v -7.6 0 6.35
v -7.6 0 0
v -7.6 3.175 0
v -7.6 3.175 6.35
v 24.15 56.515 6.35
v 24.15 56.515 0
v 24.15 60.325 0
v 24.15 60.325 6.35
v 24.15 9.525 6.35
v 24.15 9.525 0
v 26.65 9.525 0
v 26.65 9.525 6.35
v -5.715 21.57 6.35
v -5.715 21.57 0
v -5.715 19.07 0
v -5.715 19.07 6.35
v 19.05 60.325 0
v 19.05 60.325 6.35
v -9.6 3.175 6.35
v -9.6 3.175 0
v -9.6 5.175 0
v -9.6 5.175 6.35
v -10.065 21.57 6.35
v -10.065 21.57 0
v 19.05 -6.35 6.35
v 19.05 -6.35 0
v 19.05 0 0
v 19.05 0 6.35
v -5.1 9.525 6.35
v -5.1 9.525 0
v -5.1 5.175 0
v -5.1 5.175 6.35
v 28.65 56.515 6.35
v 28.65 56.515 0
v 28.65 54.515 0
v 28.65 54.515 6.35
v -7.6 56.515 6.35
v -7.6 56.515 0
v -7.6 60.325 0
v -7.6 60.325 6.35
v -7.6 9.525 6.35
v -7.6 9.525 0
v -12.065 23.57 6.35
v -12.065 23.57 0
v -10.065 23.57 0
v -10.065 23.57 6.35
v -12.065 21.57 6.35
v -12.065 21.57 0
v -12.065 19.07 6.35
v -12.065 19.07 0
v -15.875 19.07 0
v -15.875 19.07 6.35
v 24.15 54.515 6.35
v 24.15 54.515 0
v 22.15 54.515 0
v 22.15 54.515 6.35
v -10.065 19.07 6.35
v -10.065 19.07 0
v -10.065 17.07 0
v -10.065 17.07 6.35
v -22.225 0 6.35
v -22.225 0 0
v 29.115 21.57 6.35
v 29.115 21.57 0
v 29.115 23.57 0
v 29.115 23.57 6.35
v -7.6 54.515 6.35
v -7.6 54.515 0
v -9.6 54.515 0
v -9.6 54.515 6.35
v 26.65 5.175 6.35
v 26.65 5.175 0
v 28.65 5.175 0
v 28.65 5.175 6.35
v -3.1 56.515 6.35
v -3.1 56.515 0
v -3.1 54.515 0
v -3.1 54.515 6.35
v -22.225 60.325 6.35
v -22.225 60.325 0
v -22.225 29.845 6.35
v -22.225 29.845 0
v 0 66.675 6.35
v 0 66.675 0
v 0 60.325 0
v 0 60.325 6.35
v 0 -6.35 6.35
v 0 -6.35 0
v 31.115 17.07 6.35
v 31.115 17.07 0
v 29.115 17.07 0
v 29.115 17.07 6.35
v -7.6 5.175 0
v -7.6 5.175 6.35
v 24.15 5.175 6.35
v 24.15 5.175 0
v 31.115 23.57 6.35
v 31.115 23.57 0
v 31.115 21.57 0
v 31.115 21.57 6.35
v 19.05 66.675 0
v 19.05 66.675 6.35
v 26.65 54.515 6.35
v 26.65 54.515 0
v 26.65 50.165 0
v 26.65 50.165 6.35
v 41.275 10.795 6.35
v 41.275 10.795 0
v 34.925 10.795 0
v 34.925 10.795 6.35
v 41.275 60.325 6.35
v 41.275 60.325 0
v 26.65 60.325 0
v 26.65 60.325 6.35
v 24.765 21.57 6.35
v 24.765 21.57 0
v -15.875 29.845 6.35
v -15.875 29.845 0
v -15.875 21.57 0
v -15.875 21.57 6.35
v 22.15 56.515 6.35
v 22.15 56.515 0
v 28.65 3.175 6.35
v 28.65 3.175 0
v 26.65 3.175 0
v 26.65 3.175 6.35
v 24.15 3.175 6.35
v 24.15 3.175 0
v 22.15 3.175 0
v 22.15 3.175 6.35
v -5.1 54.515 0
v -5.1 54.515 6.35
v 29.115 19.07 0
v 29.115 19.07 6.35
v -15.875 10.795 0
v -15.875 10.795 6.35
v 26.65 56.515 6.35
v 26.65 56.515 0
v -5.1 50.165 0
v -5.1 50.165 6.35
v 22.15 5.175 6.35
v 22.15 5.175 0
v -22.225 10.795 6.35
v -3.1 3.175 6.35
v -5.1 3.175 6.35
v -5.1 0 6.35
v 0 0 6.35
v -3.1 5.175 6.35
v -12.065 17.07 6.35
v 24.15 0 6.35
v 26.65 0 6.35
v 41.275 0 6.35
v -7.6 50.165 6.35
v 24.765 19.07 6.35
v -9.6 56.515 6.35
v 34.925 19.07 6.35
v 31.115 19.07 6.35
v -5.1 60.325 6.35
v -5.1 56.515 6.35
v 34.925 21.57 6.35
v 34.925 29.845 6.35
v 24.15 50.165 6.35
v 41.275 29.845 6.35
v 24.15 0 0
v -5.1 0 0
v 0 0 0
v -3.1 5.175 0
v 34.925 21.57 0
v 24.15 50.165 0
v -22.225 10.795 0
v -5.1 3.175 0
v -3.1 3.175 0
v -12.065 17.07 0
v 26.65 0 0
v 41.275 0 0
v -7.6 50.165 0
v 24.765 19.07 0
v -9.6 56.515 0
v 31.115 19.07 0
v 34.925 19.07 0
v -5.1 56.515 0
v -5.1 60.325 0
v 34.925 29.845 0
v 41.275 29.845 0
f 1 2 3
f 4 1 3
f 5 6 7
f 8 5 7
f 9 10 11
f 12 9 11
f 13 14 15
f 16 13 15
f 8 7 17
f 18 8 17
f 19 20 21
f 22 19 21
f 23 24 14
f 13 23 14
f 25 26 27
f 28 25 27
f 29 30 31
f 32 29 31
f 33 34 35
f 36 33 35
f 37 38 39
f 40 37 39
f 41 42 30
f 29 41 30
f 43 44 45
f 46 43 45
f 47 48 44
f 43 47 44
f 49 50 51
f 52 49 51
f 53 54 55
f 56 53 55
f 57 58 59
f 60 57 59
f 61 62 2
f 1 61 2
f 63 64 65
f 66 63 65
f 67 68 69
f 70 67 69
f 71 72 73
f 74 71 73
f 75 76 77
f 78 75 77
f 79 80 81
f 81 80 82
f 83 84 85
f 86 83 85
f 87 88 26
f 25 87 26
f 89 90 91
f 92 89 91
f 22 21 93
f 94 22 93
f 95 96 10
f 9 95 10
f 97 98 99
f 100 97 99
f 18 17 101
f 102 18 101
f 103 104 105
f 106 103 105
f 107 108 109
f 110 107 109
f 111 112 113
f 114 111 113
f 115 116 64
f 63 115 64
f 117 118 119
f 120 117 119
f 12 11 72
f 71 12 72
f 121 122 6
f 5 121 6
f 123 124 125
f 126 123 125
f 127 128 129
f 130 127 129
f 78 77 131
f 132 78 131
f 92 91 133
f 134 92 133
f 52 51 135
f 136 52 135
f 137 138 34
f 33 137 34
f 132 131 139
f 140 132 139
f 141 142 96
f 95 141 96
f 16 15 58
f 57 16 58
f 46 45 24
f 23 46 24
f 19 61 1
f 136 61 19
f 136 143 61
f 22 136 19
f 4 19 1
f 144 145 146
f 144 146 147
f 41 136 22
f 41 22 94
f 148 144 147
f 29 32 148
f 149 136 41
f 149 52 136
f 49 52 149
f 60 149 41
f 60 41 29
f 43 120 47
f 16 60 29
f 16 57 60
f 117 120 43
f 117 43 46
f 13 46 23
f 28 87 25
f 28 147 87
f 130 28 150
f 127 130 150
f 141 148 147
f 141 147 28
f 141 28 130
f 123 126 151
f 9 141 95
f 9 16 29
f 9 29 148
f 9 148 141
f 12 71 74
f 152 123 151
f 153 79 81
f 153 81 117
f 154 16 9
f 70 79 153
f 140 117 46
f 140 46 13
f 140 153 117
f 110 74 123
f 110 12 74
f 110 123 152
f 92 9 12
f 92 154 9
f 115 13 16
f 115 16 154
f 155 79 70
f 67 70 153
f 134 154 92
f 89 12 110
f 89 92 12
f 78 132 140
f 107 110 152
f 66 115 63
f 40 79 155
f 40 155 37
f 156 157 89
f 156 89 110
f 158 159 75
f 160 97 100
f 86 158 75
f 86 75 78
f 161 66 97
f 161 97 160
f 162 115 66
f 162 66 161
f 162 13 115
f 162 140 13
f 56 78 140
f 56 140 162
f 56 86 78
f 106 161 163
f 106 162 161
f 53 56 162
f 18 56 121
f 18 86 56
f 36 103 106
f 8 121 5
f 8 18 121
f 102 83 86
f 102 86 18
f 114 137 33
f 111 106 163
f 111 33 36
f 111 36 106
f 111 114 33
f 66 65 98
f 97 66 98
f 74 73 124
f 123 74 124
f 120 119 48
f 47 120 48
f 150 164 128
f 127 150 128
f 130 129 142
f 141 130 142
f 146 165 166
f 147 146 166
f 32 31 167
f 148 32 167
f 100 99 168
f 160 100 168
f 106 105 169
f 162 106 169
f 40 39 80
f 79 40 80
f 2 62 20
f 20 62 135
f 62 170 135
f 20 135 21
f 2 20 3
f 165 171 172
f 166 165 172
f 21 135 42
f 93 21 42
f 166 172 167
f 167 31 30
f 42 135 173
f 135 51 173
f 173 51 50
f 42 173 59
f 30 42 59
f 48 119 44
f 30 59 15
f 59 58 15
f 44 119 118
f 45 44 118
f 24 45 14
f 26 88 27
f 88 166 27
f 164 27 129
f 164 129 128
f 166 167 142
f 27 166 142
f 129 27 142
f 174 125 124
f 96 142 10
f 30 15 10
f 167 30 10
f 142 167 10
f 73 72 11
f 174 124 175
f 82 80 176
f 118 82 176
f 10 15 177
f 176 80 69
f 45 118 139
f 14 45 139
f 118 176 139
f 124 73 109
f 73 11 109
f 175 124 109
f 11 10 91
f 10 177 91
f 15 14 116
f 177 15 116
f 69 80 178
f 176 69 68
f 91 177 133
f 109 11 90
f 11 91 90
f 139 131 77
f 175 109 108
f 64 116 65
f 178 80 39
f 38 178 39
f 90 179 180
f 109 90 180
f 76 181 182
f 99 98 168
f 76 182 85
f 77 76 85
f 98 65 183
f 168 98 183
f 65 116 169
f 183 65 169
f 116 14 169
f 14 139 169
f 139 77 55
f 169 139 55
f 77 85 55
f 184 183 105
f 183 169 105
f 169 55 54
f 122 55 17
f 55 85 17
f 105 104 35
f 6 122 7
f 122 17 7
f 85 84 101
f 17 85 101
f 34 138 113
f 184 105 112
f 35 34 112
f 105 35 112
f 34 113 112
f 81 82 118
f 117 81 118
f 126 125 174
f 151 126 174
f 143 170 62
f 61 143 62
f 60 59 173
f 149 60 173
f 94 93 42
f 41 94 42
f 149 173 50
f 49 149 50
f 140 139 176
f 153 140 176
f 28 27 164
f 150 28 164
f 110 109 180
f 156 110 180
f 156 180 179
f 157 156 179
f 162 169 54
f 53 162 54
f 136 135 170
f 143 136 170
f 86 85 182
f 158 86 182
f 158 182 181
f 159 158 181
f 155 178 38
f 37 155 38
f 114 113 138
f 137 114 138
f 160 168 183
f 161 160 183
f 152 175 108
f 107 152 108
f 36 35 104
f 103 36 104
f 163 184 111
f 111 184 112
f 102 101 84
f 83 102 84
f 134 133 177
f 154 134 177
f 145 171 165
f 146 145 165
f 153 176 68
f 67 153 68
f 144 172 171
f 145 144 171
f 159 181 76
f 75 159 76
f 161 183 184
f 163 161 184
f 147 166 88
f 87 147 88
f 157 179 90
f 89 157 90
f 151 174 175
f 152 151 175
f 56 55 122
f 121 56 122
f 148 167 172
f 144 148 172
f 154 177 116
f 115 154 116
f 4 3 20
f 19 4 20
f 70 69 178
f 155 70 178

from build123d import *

# Parameters (mm, degrees)
BOSS_EXTRUDE1_DEPTH = 6.35


with BuildPart() as part:
    # Sketch1 → Boss-Extrude1 (new body)
    with BuildSketch(Plane.XY):
        Polygon((0, -6.35), (19.05, -6.35), (19.05, 0), (24.15, 0), (24.15, 3.175), (22.15, 3.175), (22.15, 5.175), (24.15, 5.175), (24.15, 9.525), (26.65, 9.525), (26.65, 5.175), (28.65, 5.175), (28.65, 3.175), (26.65, 3.175), (26.65, 0), (34.925, 0), (41.275, 0), (41.275, 10.795), (34.925, 10.795), (34.925, 19.07), (31.115, 19.07), (31.115, 17.07), (29.115, 17.07), (29.115, 19.07), (24.765, 19.07), (24.765, 21.57), (29.115, 21.57), (29.115, 23.57), (31.115, 23.57), (31.115, 21.57), (34.925, 21.57), (34.925, 29.845), (41.275, 29.845), (41.275, 60.325), (34.925, 60.325), (26.65, 60.325), (26.65, 56.515), (28.65, 56.515), (28.65, 54.515), (26.65, 54.515), (26.65, 50.165), (24.15, 50.165), (24.15, 54.515), (22.15, 54.515), (22.15, 56.515), (24.15, 56.515), (24.15, 60.325), (19.05, 60.325), (19.05, 66.675), (0, 66.675), (0, 60.325), (-5.1, 60.325), (-5.1, 56.515), (-3.1, 56.515), (-3.1, 54.515), (-5.1, 54.515), (-5.1, 50.165), (-7.6, 50.165), (-7.6, 54.515), (-9.6, 54.515), (-9.6, 56.515), (-7.6, 56.515), (-7.6, 60.325), (-15.875, 60.325), (-22.225, 60.325), (-22.225, 29.845), (-15.875, 29.845), (-15.875, 21.57), (-12.065, 21.57), (-12.065, 23.57), (-10.065, 23.57), (-10.065, 21.57), (-5.715, 21.57), (-5.715, 19.07), (-10.065, 19.07), (-10.065, 17.07), (-12.065, 17.07), (-12.065, 19.07), (-15.875, 19.07), (-15.875, 10.795), (-22.225, 10.795), (-22.225, 0), (-15.875, 0), (-7.6, 0), (-7.6, 3.175), (-9.6, 3.175), (-9.6, 5.175), (-7.6, 5.175), (-7.6, 9.525), (-5.1, 9.525), (-5.1, 5.175), (-3.1, 5.175), (-3.1, 3.175), (-5.1, 3.175), (-5.1, 0), (0, 0), align=None)
    extrude(amount=BOSS_EXTRUDE1_DEPTH)


solid = part.part
